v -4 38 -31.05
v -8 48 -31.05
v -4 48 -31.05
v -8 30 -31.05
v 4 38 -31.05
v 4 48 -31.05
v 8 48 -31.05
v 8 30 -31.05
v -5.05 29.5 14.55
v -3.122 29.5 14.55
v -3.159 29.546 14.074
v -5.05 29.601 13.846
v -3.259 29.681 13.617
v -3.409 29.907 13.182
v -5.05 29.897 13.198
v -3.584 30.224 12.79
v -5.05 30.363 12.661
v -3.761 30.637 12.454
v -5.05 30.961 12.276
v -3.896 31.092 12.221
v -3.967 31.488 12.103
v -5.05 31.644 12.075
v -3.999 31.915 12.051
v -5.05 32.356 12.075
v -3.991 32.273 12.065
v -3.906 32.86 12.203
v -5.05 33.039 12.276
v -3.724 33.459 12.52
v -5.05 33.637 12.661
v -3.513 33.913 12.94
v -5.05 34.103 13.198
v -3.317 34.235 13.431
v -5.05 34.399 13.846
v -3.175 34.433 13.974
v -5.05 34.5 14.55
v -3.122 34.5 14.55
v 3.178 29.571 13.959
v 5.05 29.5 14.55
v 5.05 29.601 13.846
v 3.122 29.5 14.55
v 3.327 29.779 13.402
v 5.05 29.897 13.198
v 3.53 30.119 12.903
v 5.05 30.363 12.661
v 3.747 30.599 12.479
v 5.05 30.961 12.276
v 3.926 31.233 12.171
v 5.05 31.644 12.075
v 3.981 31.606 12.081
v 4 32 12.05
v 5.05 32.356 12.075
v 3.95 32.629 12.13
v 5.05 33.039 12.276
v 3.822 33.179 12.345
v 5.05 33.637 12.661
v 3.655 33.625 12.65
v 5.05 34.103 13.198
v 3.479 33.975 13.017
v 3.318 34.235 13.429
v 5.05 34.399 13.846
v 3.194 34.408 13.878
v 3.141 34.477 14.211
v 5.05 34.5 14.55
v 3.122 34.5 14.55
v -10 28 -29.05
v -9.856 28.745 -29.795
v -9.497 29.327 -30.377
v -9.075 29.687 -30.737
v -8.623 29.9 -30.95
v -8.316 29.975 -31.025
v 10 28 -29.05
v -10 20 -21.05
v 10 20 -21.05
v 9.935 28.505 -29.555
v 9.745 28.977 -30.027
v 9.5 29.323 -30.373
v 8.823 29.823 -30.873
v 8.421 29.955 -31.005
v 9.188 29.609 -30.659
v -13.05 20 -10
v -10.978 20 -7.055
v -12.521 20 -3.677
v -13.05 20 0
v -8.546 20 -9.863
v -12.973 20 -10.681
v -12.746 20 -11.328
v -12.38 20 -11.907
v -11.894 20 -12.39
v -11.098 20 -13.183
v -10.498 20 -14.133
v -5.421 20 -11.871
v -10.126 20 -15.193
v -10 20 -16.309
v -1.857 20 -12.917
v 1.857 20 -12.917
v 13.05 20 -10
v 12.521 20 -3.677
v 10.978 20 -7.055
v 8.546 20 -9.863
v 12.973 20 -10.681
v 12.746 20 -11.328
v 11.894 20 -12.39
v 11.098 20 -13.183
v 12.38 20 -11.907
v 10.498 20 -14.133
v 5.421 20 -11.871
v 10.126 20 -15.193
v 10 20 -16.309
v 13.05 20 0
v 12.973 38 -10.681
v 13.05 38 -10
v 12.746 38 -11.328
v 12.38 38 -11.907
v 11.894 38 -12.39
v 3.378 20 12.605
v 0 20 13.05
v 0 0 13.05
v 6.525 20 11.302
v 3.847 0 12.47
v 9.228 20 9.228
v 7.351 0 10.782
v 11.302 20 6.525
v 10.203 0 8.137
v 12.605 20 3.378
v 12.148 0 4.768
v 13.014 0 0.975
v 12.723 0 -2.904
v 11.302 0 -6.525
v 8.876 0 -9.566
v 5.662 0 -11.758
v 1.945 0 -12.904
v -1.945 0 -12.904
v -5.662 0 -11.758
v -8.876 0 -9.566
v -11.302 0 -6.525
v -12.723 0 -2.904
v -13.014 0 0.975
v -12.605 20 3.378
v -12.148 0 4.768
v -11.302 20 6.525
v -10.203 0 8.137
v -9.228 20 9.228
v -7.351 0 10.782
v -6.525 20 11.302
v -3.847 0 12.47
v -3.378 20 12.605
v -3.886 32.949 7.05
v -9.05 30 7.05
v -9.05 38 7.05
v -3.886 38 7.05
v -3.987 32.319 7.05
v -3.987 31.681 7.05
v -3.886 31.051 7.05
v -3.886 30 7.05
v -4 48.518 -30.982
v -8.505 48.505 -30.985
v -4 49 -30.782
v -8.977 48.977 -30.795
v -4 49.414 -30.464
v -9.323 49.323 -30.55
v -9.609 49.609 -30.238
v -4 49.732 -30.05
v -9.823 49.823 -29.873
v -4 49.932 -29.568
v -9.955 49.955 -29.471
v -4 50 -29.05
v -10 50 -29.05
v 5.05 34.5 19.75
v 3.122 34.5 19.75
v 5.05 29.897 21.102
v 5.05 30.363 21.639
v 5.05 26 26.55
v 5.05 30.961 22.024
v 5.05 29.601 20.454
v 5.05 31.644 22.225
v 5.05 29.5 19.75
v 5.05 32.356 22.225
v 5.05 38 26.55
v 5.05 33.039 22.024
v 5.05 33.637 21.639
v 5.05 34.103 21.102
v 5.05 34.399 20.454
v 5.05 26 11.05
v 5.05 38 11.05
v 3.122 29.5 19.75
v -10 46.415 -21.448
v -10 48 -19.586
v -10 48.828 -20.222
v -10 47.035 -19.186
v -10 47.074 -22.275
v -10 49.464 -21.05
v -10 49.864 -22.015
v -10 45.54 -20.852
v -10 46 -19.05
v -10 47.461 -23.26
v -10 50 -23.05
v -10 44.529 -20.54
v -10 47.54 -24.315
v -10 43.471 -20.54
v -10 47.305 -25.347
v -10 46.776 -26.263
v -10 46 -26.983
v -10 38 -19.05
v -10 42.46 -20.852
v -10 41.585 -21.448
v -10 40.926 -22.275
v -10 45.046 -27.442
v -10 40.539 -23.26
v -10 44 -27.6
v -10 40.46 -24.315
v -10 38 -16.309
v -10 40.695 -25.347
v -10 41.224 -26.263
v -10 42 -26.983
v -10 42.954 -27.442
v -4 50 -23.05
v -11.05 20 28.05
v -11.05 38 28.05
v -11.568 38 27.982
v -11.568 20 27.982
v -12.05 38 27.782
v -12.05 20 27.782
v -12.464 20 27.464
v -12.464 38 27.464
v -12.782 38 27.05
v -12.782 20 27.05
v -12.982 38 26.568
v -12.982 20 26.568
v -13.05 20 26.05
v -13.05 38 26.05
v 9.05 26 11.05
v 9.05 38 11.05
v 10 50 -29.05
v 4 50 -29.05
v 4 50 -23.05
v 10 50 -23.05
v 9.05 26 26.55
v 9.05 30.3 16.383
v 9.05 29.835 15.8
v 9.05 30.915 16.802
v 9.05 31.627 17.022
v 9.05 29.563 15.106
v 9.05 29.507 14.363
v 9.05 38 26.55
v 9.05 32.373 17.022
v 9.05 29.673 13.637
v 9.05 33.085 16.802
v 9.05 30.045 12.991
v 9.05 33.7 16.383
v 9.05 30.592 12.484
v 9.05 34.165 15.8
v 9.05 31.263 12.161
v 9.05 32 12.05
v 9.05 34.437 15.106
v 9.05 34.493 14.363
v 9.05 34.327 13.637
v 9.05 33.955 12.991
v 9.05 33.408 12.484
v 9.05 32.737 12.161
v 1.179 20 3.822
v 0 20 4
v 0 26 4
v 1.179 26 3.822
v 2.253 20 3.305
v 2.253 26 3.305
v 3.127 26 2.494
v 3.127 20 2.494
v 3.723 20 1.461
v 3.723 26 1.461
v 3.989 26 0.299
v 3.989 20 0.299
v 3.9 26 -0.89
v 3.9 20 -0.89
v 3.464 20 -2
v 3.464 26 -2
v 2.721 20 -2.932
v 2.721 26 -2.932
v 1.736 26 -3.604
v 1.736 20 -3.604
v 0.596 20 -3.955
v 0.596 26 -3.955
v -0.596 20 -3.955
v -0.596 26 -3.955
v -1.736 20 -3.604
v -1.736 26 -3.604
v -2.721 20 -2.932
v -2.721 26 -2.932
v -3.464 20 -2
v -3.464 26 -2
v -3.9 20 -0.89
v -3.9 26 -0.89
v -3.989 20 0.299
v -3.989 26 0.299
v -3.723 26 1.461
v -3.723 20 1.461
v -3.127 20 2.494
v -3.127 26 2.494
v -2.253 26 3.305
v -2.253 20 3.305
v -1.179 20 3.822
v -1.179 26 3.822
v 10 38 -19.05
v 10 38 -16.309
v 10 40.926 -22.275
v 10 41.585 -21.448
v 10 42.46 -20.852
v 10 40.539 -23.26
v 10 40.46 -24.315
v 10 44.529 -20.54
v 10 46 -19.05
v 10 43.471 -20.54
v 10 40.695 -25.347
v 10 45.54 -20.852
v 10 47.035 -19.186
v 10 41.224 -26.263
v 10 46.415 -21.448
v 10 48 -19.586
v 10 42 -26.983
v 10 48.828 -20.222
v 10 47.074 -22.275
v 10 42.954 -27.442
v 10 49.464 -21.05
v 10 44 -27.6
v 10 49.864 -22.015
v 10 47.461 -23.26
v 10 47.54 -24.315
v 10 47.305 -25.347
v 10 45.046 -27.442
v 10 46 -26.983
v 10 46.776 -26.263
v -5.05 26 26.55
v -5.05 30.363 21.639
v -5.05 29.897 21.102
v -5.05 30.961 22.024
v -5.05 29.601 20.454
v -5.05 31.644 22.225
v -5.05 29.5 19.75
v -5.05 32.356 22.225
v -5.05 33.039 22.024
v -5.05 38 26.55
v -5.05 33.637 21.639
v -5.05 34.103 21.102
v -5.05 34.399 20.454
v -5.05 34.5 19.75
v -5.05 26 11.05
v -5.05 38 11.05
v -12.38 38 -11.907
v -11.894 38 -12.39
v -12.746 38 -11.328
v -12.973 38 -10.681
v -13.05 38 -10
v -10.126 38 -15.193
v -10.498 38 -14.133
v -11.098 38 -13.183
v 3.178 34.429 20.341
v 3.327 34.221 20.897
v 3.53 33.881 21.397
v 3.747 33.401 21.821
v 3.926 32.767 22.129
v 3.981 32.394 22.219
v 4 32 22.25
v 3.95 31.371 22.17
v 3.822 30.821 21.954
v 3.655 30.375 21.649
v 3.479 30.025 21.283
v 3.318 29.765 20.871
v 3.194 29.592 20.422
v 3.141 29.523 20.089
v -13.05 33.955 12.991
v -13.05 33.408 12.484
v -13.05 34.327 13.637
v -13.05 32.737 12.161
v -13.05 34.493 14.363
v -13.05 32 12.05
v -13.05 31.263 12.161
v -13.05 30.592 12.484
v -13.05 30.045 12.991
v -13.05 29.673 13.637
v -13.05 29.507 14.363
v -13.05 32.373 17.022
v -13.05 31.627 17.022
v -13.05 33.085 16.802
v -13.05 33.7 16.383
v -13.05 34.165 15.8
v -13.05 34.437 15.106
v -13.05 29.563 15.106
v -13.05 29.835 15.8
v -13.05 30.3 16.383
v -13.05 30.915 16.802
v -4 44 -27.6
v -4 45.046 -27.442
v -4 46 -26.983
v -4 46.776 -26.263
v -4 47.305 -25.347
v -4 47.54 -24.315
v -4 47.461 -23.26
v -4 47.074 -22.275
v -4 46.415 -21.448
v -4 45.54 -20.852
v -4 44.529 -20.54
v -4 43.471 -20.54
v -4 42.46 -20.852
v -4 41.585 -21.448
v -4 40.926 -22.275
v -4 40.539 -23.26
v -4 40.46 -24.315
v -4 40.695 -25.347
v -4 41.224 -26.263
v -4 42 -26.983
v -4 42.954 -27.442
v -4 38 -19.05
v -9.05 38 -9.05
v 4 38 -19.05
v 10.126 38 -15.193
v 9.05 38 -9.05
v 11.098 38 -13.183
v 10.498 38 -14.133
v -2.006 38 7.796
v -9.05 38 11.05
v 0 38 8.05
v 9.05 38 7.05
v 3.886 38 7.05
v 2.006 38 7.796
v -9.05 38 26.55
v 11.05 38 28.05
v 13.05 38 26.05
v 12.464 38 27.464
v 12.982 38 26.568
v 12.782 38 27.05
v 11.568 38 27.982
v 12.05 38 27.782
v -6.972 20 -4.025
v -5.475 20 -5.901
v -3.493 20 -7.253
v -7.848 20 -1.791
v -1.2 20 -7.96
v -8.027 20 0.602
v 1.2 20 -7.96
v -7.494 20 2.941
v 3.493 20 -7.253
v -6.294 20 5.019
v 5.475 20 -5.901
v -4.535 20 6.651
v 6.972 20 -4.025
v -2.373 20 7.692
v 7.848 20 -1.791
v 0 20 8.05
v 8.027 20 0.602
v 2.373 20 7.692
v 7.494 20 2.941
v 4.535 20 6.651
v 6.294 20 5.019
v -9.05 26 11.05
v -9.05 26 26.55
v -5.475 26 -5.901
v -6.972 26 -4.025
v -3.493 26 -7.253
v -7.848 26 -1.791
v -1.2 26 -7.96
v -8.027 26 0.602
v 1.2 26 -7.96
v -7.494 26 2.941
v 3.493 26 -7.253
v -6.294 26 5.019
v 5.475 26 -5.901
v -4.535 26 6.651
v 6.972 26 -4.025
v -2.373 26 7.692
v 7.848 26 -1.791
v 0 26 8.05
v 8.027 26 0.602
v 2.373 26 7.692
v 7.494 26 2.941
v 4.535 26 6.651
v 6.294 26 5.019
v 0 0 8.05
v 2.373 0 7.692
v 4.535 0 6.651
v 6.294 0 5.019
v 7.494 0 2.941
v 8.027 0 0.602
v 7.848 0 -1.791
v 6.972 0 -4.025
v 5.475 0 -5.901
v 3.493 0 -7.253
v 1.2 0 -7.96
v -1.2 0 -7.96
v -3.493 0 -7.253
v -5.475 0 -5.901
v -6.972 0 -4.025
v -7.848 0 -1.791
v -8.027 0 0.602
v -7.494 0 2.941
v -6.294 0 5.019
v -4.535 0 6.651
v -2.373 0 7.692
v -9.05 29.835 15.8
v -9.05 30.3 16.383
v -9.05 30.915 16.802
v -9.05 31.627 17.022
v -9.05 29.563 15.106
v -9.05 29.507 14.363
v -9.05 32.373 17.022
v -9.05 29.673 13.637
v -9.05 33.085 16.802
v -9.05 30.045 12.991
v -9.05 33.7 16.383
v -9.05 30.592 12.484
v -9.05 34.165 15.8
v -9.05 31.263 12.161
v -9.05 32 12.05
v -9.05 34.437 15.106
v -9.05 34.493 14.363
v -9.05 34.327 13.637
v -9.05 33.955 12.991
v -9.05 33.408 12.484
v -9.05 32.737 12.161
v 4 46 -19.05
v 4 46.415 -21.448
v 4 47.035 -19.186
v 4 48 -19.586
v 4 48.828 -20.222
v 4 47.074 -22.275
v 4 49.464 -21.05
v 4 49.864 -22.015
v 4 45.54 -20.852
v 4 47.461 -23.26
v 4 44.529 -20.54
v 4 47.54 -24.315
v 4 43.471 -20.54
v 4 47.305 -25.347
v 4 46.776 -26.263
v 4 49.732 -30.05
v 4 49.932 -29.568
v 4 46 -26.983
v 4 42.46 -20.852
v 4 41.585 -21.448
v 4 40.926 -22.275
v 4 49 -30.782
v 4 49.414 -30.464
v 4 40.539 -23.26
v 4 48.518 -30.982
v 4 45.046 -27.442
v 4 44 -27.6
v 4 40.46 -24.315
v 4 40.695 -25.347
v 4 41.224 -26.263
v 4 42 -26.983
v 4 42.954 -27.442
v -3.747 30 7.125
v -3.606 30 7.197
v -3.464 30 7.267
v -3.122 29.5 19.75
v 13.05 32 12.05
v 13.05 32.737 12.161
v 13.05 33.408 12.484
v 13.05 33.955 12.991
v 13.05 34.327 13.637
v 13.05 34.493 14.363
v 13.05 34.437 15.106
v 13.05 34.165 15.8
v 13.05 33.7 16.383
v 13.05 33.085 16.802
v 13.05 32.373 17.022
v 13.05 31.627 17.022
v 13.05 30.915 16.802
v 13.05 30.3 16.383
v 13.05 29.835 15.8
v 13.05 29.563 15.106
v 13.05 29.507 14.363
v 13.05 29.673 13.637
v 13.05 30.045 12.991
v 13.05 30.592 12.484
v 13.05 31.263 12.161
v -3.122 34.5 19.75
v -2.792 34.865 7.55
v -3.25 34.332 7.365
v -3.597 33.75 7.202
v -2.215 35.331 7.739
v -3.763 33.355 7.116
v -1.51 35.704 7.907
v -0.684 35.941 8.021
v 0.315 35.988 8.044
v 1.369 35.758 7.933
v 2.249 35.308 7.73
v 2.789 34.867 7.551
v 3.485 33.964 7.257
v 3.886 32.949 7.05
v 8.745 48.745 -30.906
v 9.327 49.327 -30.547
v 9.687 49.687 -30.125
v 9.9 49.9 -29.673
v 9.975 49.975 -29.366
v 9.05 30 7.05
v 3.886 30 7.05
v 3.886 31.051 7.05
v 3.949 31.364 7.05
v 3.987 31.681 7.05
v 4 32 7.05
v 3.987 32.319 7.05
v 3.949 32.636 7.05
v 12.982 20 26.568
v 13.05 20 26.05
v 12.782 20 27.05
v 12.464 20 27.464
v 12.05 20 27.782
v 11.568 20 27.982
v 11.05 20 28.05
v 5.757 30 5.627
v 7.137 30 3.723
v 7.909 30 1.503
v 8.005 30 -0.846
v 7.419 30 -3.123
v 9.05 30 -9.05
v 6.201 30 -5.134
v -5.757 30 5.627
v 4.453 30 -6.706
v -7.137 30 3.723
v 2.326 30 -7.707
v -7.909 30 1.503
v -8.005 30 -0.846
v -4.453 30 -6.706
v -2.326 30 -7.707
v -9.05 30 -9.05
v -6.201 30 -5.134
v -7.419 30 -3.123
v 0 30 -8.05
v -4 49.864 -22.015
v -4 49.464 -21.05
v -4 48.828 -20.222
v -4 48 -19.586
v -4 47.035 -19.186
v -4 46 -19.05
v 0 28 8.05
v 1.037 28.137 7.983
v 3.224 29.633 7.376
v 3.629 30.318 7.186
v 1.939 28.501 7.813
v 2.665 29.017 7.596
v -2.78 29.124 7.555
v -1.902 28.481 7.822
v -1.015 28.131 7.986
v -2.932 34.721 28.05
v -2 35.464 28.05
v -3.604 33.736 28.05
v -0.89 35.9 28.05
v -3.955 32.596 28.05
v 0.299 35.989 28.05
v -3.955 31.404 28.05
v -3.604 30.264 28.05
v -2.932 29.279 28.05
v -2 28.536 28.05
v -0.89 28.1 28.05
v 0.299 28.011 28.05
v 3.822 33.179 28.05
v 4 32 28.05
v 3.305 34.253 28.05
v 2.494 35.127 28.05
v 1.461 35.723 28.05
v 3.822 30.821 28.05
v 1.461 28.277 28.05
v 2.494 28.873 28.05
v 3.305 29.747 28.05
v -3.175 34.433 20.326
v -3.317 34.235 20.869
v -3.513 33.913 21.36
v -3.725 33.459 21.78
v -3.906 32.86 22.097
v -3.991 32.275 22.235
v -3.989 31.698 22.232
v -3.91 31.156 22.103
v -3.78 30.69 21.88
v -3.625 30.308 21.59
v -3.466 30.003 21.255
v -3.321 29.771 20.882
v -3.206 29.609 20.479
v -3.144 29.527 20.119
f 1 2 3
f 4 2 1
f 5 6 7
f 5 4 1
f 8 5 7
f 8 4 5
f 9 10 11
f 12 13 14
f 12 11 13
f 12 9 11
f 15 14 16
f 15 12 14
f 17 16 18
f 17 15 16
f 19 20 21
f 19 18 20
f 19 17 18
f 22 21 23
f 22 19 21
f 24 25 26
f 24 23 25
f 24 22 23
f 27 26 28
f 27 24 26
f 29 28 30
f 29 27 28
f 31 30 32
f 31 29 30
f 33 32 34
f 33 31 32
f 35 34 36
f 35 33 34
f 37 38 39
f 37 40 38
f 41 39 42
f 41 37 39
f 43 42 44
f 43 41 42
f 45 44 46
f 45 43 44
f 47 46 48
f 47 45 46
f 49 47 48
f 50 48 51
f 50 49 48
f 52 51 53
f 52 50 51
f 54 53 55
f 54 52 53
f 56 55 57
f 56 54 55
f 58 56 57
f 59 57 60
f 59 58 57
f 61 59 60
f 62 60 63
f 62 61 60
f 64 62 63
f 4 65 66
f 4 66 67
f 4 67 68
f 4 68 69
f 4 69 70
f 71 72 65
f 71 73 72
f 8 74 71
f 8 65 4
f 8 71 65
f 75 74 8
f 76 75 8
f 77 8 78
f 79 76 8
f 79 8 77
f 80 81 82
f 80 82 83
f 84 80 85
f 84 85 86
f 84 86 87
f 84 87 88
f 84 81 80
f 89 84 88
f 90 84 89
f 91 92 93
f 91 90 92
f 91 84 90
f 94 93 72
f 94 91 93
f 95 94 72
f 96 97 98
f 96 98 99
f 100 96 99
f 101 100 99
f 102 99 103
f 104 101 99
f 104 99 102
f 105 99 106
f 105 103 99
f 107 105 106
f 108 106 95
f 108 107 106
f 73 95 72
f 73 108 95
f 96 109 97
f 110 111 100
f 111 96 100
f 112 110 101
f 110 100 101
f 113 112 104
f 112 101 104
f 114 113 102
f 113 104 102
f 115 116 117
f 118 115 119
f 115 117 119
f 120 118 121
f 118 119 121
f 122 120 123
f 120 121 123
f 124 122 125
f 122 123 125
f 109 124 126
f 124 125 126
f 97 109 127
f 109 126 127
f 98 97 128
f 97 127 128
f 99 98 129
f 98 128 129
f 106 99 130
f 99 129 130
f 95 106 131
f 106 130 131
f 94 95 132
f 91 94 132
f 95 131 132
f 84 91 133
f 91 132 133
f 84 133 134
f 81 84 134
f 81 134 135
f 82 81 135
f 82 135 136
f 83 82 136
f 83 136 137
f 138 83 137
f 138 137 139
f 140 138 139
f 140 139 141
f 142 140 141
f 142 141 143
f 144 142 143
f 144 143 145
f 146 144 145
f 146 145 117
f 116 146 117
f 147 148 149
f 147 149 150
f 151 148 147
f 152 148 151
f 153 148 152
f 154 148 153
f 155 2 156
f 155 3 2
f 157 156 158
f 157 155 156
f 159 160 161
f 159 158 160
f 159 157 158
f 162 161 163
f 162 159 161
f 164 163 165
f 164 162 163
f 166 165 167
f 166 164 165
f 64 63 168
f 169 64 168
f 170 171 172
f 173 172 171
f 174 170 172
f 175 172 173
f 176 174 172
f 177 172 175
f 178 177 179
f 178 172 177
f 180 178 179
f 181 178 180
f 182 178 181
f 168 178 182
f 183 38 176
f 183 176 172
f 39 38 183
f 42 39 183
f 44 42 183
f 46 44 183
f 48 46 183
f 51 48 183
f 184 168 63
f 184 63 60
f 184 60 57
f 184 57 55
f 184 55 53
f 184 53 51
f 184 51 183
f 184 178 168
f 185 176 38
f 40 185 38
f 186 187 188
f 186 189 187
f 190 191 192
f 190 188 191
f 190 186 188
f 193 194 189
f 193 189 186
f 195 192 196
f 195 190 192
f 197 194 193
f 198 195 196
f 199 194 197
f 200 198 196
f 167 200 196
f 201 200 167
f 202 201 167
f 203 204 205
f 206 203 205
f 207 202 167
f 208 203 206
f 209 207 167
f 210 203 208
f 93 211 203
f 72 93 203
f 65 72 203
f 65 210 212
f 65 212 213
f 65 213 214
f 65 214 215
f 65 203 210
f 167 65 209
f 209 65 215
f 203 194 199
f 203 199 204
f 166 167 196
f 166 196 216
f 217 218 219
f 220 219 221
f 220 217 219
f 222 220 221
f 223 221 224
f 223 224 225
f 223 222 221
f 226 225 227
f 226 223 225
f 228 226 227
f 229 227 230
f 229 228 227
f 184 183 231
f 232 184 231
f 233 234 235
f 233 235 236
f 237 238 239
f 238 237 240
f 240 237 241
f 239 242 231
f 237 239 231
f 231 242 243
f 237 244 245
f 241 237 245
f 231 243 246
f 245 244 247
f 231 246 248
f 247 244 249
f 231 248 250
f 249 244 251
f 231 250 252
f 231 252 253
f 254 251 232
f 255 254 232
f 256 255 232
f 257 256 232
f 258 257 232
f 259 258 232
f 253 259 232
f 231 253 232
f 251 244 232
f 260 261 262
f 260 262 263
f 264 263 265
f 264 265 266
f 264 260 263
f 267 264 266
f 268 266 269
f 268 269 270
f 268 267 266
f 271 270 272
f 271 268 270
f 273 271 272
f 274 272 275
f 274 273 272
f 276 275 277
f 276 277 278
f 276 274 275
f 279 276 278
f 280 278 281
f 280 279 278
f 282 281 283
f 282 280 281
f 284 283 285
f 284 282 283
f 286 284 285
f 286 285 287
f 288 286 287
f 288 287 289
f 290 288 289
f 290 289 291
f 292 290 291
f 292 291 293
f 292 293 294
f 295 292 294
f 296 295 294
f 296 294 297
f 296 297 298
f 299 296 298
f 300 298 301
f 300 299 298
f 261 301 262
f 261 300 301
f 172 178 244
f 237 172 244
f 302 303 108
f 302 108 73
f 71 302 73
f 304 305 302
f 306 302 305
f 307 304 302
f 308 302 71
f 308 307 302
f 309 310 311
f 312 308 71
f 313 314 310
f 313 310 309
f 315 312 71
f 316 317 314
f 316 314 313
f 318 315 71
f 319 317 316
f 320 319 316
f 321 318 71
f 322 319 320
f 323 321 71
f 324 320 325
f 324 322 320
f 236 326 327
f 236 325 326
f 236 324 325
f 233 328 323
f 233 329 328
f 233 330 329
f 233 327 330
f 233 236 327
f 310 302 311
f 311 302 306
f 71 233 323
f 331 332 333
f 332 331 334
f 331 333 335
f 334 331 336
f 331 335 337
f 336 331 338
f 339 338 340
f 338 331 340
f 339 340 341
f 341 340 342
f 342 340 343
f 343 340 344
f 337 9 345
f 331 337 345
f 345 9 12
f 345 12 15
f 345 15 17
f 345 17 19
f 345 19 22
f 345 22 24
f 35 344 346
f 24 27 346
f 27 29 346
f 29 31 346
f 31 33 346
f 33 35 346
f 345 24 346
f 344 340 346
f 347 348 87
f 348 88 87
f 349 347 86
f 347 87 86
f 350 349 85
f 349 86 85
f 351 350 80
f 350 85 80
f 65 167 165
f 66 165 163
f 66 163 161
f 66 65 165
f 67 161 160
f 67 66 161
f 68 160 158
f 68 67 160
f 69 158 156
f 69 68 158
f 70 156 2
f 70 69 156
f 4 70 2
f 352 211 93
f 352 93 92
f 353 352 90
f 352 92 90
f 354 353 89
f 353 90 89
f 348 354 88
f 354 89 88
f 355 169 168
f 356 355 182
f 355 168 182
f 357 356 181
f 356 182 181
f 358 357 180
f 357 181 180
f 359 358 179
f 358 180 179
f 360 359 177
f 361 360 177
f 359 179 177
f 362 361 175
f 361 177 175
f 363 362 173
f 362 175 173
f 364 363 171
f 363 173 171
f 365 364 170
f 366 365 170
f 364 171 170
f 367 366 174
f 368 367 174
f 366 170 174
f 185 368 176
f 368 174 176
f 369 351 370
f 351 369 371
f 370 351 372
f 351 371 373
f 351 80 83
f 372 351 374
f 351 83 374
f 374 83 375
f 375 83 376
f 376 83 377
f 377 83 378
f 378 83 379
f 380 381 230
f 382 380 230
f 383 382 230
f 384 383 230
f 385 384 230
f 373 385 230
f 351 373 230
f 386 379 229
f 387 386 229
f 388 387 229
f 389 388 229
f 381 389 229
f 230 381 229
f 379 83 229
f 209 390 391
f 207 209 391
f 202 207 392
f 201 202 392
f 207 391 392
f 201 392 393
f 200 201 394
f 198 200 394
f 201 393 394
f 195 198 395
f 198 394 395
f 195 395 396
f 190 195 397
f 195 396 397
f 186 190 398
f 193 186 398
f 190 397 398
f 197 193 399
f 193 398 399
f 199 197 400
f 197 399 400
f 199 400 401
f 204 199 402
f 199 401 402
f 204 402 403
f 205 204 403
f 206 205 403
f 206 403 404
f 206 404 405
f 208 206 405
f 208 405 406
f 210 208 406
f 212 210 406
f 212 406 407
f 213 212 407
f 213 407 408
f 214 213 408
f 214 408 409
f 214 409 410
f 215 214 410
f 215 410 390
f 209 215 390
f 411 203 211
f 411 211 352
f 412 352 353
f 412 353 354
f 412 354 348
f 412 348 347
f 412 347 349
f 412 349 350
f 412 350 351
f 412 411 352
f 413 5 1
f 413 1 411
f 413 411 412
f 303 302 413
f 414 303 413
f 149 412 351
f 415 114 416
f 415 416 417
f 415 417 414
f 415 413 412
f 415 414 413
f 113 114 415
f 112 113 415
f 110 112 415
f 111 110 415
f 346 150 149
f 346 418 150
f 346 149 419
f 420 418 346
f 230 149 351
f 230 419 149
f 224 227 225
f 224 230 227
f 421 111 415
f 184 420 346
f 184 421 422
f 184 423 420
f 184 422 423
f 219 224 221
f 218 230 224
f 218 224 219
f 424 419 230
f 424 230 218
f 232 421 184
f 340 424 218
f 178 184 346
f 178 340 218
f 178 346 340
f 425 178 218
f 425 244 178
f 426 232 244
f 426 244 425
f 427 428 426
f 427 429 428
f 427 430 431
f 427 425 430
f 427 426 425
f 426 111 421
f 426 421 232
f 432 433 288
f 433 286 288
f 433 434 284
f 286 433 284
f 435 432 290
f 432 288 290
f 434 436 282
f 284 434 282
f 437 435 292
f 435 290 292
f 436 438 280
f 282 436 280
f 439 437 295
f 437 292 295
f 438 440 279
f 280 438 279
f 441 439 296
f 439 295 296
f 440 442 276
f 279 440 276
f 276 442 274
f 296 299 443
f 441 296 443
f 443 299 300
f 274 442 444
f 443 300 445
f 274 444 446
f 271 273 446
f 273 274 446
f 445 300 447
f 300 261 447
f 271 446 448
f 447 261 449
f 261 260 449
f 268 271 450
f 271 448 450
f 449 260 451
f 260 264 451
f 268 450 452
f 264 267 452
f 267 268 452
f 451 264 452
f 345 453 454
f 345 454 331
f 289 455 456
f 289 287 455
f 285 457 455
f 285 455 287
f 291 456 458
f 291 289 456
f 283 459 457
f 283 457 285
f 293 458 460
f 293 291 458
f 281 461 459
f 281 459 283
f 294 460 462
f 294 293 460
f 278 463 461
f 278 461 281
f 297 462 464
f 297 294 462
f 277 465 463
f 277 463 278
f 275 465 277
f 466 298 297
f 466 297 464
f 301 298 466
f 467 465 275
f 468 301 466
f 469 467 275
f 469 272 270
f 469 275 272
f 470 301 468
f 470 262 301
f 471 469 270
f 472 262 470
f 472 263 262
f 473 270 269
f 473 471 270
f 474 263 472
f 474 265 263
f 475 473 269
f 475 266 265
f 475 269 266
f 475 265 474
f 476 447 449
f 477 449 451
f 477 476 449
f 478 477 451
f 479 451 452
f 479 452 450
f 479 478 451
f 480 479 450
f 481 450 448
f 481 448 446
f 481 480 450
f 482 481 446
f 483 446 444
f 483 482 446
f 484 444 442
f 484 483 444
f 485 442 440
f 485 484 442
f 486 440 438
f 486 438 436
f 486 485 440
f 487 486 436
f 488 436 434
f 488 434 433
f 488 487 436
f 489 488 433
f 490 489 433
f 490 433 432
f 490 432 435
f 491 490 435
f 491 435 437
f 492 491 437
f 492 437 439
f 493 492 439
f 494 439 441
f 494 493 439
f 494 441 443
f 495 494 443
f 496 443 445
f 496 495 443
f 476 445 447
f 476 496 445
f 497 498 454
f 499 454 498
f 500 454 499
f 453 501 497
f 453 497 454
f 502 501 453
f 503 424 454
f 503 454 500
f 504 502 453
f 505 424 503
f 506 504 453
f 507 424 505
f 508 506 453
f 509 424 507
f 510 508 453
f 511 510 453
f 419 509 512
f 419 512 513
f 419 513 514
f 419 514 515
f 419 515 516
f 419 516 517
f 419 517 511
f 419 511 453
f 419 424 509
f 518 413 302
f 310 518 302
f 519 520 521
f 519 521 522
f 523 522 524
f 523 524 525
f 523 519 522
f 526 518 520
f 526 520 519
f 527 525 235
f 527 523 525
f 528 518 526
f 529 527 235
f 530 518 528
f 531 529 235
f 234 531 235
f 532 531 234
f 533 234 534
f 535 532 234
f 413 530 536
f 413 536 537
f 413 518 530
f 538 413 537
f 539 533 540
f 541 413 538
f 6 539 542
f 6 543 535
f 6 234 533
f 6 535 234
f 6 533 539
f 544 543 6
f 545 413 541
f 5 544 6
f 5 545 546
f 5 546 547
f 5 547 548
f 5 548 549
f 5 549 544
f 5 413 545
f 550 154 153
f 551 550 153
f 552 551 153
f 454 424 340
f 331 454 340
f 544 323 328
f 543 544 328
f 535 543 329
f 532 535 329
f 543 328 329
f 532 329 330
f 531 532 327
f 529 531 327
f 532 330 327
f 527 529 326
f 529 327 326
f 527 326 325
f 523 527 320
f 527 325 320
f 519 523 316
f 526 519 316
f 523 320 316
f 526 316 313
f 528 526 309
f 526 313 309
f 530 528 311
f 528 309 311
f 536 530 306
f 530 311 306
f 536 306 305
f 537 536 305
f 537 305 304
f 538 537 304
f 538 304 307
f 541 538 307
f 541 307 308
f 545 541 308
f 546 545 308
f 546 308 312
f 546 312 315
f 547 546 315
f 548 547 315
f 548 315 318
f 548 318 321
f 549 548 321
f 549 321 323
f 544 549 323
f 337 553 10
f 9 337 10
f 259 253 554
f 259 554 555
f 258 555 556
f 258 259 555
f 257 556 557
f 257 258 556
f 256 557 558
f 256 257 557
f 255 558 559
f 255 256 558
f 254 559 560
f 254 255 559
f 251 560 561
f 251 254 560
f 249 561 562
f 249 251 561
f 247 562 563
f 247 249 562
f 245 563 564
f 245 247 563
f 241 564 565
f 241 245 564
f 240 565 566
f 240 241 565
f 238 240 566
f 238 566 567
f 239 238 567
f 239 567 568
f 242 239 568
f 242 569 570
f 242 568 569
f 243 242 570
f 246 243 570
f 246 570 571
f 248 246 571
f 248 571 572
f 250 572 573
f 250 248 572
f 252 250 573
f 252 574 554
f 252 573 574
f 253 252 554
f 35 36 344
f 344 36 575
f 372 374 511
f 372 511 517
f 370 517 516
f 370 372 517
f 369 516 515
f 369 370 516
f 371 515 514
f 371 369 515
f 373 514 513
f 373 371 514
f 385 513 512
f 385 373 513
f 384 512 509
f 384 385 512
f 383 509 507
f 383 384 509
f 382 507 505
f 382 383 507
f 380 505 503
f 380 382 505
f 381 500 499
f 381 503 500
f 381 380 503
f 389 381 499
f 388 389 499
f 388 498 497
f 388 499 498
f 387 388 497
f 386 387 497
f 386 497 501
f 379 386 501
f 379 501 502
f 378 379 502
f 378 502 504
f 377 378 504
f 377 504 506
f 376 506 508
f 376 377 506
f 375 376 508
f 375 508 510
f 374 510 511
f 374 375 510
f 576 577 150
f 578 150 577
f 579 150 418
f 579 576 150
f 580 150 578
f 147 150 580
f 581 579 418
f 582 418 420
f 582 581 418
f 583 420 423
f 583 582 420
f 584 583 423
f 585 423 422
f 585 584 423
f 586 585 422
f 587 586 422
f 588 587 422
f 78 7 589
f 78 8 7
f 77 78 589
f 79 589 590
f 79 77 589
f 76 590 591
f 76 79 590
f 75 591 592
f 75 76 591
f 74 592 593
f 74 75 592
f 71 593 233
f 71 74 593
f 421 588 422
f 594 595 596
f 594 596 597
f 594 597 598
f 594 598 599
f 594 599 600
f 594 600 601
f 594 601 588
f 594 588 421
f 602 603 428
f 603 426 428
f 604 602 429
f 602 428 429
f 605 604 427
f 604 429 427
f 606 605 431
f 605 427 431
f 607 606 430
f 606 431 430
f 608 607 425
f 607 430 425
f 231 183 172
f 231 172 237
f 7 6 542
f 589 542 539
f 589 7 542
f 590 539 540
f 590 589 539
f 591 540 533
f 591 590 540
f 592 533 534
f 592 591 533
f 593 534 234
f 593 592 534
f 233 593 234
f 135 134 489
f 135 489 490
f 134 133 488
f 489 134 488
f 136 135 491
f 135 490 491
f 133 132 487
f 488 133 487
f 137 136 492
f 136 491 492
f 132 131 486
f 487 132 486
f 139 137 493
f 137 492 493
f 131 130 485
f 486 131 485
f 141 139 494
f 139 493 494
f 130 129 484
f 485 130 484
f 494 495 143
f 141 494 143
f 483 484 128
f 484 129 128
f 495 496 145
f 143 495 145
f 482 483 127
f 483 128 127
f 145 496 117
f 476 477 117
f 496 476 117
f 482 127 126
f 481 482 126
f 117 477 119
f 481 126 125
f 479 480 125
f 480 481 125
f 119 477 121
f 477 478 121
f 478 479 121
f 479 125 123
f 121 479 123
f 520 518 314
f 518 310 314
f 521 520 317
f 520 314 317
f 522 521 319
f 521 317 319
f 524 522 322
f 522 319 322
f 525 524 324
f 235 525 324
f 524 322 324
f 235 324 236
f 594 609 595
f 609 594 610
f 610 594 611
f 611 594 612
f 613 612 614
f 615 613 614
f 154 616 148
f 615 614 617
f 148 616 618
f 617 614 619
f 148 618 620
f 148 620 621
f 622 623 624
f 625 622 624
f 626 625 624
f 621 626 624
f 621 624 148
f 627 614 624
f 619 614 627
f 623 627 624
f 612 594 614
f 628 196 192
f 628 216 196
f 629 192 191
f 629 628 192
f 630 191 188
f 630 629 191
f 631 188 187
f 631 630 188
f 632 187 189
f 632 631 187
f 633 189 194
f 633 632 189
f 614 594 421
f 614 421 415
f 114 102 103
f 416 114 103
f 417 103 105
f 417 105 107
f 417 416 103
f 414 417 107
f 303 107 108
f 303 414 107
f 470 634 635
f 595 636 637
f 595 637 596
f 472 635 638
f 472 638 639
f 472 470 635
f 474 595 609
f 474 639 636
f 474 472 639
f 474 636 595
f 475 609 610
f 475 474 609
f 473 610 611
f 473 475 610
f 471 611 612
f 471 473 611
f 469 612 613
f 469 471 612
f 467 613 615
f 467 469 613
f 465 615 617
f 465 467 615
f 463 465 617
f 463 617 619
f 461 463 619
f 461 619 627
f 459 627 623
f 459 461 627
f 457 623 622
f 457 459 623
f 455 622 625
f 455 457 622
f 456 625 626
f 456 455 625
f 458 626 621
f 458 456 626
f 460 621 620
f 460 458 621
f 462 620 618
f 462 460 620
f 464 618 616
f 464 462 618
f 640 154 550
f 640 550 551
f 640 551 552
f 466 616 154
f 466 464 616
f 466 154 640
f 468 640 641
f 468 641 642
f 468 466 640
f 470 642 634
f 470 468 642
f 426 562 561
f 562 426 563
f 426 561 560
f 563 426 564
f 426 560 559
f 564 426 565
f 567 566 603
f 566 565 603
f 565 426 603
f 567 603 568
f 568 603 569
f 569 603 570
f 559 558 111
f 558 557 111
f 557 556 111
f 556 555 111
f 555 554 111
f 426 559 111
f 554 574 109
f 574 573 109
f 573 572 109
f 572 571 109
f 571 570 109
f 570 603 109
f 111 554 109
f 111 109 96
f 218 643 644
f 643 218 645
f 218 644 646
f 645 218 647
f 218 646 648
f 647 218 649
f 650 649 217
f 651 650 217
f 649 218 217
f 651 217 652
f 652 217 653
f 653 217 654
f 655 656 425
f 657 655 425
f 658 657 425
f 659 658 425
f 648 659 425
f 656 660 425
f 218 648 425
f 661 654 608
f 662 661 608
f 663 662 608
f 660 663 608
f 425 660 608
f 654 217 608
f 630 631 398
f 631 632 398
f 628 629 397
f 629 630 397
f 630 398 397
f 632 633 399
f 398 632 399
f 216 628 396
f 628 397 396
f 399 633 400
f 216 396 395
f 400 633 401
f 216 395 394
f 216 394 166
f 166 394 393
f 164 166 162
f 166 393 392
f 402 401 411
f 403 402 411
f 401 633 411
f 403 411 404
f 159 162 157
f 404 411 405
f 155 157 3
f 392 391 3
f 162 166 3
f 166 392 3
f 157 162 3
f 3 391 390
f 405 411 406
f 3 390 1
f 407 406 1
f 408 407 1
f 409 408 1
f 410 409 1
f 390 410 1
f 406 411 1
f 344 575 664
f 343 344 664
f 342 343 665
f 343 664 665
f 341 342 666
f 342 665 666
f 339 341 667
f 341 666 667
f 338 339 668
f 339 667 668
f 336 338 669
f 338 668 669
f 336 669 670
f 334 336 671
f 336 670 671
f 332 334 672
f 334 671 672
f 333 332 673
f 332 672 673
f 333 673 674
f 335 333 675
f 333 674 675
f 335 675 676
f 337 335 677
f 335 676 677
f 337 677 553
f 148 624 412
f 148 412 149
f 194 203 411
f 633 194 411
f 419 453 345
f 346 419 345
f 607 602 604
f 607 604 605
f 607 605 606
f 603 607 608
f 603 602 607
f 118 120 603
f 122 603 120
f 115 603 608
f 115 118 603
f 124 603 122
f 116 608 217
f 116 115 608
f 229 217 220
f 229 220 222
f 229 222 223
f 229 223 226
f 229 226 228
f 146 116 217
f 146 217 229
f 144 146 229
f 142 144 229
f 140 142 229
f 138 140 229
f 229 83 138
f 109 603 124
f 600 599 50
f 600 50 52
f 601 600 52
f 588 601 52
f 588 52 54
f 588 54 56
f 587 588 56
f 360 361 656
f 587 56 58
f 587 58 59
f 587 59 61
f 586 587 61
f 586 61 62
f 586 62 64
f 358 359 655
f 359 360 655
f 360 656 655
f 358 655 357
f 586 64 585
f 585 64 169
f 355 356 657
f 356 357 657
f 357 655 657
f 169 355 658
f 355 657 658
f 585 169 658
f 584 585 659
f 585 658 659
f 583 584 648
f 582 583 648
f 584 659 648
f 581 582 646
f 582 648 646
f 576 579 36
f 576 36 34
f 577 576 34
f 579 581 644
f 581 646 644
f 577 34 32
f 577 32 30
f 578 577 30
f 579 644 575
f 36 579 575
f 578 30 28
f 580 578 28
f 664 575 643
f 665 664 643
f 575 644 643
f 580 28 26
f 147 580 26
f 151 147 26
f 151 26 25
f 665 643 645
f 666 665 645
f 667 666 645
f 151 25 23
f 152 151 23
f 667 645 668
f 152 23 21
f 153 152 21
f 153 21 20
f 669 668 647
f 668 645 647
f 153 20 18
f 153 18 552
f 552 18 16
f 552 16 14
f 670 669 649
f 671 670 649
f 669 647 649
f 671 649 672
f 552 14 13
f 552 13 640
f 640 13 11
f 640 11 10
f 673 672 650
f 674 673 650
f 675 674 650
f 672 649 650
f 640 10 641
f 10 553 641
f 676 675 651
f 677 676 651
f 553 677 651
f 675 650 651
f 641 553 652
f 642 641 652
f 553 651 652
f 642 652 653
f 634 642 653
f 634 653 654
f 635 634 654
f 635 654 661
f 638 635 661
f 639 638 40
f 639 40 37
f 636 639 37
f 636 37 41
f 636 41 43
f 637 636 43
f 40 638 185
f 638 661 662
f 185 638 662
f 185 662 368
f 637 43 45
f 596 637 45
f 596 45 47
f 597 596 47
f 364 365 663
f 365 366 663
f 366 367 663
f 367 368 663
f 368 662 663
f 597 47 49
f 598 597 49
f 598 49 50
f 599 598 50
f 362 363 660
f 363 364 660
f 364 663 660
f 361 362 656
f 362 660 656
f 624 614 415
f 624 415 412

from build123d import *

# Parameters (mm, degrees)
SKETCH1_R               = 13.05
SKETCH1_R_2             = 8.05
BOSS_EXTRUDE1_DEPTH     = 20
SKETCH2_R               = 8.05
BOSS_EXTRUDE2_DEPTH     = 10
SKETCH3_W               = 18.1
SKETCH3_H               = 13
CUT_EXTRUDE1_DEPTH      = 4
SKETCH4_W               = 18.1
SKETCH4_H               = 13
BOSS_EXTRUDE3_DEPTH     = 8
SKETCH5_R               = 8.05
SKETCH5_R_2             = 4
BOSS_EXTRUDE4_DEPTH     = 6
SKETCH10_W              = 10.1
SKETCH10_H              = 13
BOSS_EXTRUDE7_DEPTH     = 12
CUT_EXTRUDE2_REACH      = 59.476
SKETCH6_R               = 4
CUT_EXTRUDE3_DEPTH      = 54.963066195
CUT_EXTRUDE3_DEPTH_BACK = 54.963066195
SKETCH7_R               = 2.5
BOSS_EXTRUDE5_DEPTH     = 10
SKETCH13_W              = 6
SKETCH13_H              = 12
BOSS_EXTRUDE8_DEPTH     = 12
FILLET1_R               = 5
FILLET2_R               = 2
CUT_EXTRUDE4_REACH      = 63.577
CUT_EXTRUDE5_REACH      = 65.209
SKETCH14_R              = 3.55
FILLET4_R               = 4
FILLET5_R               = 2
SKETCH15_W              = 4
SKETCH15_H              = 2.5
CUT_EXTRUDE6_DEPTH      = 12


with BuildPart() as part:
    # Sketch1 → Boss-Extrude1 (new body)
    with BuildSketch(Plane(origin=(0, 0, 0), x_dir=(1, 0, 0), z_dir=(0, 1, 0))):
        with Locations(Location((0, 0, 0), (0, 0, 270))):
            Circle(SKETCH1_R)
        with Locations(Location((0, 0, 0), (0, 0, 270))):
            Circle(SKETCH1_R_2, mode=Mode.SUBTRACT)
    extrude(amount=BOSS_EXTRUDE1_DEPTH)

    # Sketch2 → Boss-Extrude2 (add)
    with BuildSketch(Plane(origin=(0, 20, 0), x_dir=(1, 0, 0), z_dir=(0, 1, 0))):
        with BuildLine():
            Line((-13.05, -13.05), (-13.05, 10))
            ThreePointArc((-13.05, 10), (-12.156675683, 12.156675683), (-10, 13.05))
            Line((-10, 13.05), (10, 13.05))
            ThreePointArc((10, 13.05), (12.156675683, 12.156675683), (13.05, 10))
            Line((13.05, 10), (13.05, -13.05))
            Line((13.05, -13.05), (13.05, -28.05))
            Line((13.05, -28.05), (-13.05, -28.05))
            Line((-13.05, -28.05), (-13.05, -13.05))
        make_face()
        with Locations(Location((0, 0, 0), (0, 0, 270))):
            Circle(SKETCH2_R, mode=Mode.SUBTRACT)
    extrude(amount=BOSS_EXTRUDE2_DEPTH)

    # Sketch3 → Cut-Extrude1 (cut)
    with BuildSketch(Plane(origin=(0, 30, 0), x_dir=(1, 0, 0), z_dir=(0, 1, 0))):
        with Locations((0, -17.55)):
            Rectangle(SKETCH3_W, SKETCH3_H)
    extrude(amount=-CUT_EXTRUDE1_DEPTH, mode=Mode.SUBTRACT)

    # Sketch4 → Boss-Extrude3 (add)
    with BuildSketch(Plane(origin=(0, 30, 0), x_dir=(1, 0, 0), z_dir=(0, 1, 0))):
        with BuildLine():
            Line((-13.05, -28.05), (13.05, -28.05))
            Line((13.05, -28.05), (13.05, 10))
            ThreePointArc((13.05, 10), (12.156675683, 12.156675683), (10, 13.05))
            Line((10, 13.05), (-10, 13.05))
            ThreePointArc((-10, 13.05), (-12.156675683, 12.156675683), (-13.05, 10))
            Line((-13.05, 10), (-13.05, -28.05))
        make_face()
        with BuildLine():
            Line((-9.05, 9.05), (-9.05, -7.05))
            Line((-9.05, -7.05), (-3.885871846, -7.05))
            ThreePointArc((-3.885871846, -7.05), (0, -8.05), (3.885871846, -7.05))
            Line((3.885871846, -7.05), (9.05, -7.05))
            Line((9.05, -7.05), (9.05, 9.05))
            Line((9.05, 9.05), (-9.05, 9.05))
        make_face(mode=Mode.SUBTRACT)
        with Locations((0, -17.55)):
            Rectangle(SKETCH4_W, SKETCH4_H, mode=Mode.SUBTRACT)
    extrude(amount=BOSS_EXTRUDE3_DEPTH)

    # Sketch5 → Boss-Extrude4 (add)
    with BuildSketch(Plane(origin=(0, 20, 0), x_dir=(1, 0, 0), z_dir=(0, 1, 0))):
        with Locations(Location((0, 0, 0), (0, 0, 270))):
            Circle(SKETCH5_R)
        with Locations(Location((0, 0, 0), (0, 0, 270))):
            Circle(SKETCH5_R_2, mode=Mode.SUBTRACT)
    extrude(amount=BOSS_EXTRUDE4_DEPTH)

    # Sketch10 → Boss-Extrude7 (add)
    with BuildSketch(Plane(origin=(0, 26, 0), x_dir=(1, 0, 0), z_dir=(0, 1, 0))):
        with Locations((0, -17.55)):
            Rectangle(SKETCH10_W, SKETCH10_H)
    extrude(amount=BOSS_EXTRUDE7_DEPTH)

    # Cut-Extrude2: up to this face of the body (flat: up to its plane)
    cut_extrude2_end = Plane(part.part.faces().sort_by_distance((-6.467935923, 34, 7.05))[0])
    # Sketch6 → Cut-Extrude2 (cut, up to the picked face)
    with BuildSketch(Plane.XY.offset(28.05), mode=Mode.PRIVATE) as cut_extrude2_sk1:
        with Locations((0, 32)):
            Circle(SKETCH6_R)
    cut_extrude2_tool1 = split(extrude(cut_extrude2_sk1.sketch, amount=-CUT_EXTRUDE2_REACH, mode=Mode.PRIVATE), bisect_by=cut_extrude2_end, keep=Keep.BOTH, mode=Mode.PRIVATE)
    add(cut_extrude2_tool1.solids().sort_by(Axis((0, 32, 28.05), (0, 0, -1)))[0], mode=Mode.SUBTRACT)

    # Sketch7 → Cut-Extrude3 (cut, two sides: drawn at the far end of the back side and taken through both)
    with BuildSketch(Plane(origin=(13.05, 0, 0), x_dir=(0, 0, -1), z_dir=(1, 0, 0)).offset(-CUT_EXTRUDE3_DEPTH_BACK)):
        with Locations((-14.55, 32)):
            Circle(SKETCH7_R)
    extrude(amount=CUT_EXTRUDE3_DEPTH + CUT_EXTRUDE3_DEPTH_BACK, mode=Mode.SUBTRACT)

    # Sketch8 → Boss-Extrude5 (add, symmetric)
    with BuildSketch(Plane(origin=(0, 0, 0), x_dir=(0, 0, -1), z_dir=(1, 0, 0))):
        Polygon((21.05, 20), (31.05, 30), (31.05, 38), (13.05, 38), (13.05, 20), align=None)
    extrude(amount=BOSS_EXTRUDE5_DEPTH, both=True)

    # Sketch13 → Boss-Extrude8 (add)
    with BuildSketch(Plane(origin=(0, 38, 0), x_dir=(1, 0, 0), z_dir=(0, 1, 0))):
        with Locations((-7, 25.05)):
            Rectangle(SKETCH13_W, SKETCH13_H)
        with Locations((7, 25.05)):
            Rectangle(SKETCH13_W, SKETCH13_H)
    extrude(amount=BOSS_EXTRUDE8_DEPTH)

    # Fillet1
    fillet1_edges = [part.edges().sort_by_distance(p)[0] for p in [
        (10, 29, -13.05),
        (-10, 29, -13.05),
    ]]
    fillet(fillet1_edges, radius=FILLET1_R)

    # Fillet2
    fillet2_edges = [part.edges().sort_by_distance(p)[0] for p in [
        (-10, 40, -31.05),
        (10, 40, -31.05),
        (-7, 50, -31.05),
        (7, 50, -31.05),
    ]]
    fillet(fillet2_edges, radius=FILLET2_R)

    # Cut-Extrude4: up to this face of the body (flat: up to its plane)
    cut_extrude4_end = Plane(part.part.faces().sort_by_distance((-5.05, 32, 17.981964525))[0])
    # Sketch11 → Cut-Extrude4 (cut, up to the picked face)
    with BuildSketch(Plane(origin=(5.05, 0, 0), x_dir=(0, 0, -1), z_dir=(1, 0, 0)), mode=Mode.PRIVATE) as cut_extrude4_sk1:
        with BuildLine():
            Line((-19.75, 29.5), (-14.55, 29.5))
            ThreePointArc((-14.55, 29.5), (-12.05, 32), (-14.55, 34.5))
            Line((-14.55, 34.5), (-19.75, 34.5))
            ThreePointArc((-19.75, 34.5), (-22.25, 32), (-19.75, 29.5))
        make_face()
    cut_extrude4_tool1 = split(extrude(cut_extrude4_sk1.sketch, amount=-CUT_EXTRUDE4_REACH, mode=Mode.PRIVATE), bisect_by=cut_extrude4_end, keep=Keep.BOTH, mode=Mode.PRIVATE)
    add(cut_extrude4_tool1.solids().sort_by(Axis((5.05, 32, 17.15), (-1, 0, 0)))[0], mode=Mode.SUBTRACT)

    # Cut-Extrude5: up to this face of the body (flat: up to its plane)
    cut_extrude5_end = Plane(part.part.faces().sort_by_distance((-10, 35.310803733, -22.824229644))[0])
    # Sketch14 → Cut-Extrude5 (cut, up to the picked face)
    with BuildSketch(Plane(origin=(10, 0, 0), x_dir=(0, 0, -1), z_dir=(1, 0, 0)), mode=Mode.PRIVATE) as cut_extrude5_sk1:
        with Locations((24.05, 44)):
            Circle(SKETCH14_R)
    cut_extrude5_tool1 = split(extrude(cut_extrude5_sk1.sketch, amount=-CUT_EXTRUDE5_REACH, mode=Mode.PRIVATE), bisect_by=cut_extrude5_end, keep=Keep.BOTH, mode=Mode.PRIVATE)
    add(cut_extrude5_tool1.solids().sort_by(Axis((10, 44, -24.05), (-1, 0, 0)))[0], mode=Mode.SUBTRACT)

    # Fillet4
    fillet4_edges = [part.edges().sort_by_distance(p)[0] for p in [
        (-7, 50, -19.05),
        (7, 50, -19.05),
    ]]
    fillet(fillet4_edges, radius=FILLET4_R)

    # Fillet5
    fillet5_edges = [part.edges().sort_by_distance(p)[0] for p in [
        (-13.05, 29, 28.05),
        (13.05, 29, 28.05),
    ]]
    fillet(fillet5_edges, radius=FILLET5_R)

    # Sketch15 → Cut-Extrude6 (cut)
    with BuildSketch(Plane(origin=(0, 38, 0), x_dir=(1, 0, 0), z_dir=(0, 1, 0))):
        with Locations((7.05, -25.3)):
            Rectangle(SKETCH15_W, SKETCH15_H)
        with Locations((-7.05, -25.3)):
            Rectangle(SKETCH15_W, SKETCH15_H)
    extrude(amount=-CUT_EXTRUDE6_DEPTH, mode=Mode.SUBTRACT)


solid = part.part
